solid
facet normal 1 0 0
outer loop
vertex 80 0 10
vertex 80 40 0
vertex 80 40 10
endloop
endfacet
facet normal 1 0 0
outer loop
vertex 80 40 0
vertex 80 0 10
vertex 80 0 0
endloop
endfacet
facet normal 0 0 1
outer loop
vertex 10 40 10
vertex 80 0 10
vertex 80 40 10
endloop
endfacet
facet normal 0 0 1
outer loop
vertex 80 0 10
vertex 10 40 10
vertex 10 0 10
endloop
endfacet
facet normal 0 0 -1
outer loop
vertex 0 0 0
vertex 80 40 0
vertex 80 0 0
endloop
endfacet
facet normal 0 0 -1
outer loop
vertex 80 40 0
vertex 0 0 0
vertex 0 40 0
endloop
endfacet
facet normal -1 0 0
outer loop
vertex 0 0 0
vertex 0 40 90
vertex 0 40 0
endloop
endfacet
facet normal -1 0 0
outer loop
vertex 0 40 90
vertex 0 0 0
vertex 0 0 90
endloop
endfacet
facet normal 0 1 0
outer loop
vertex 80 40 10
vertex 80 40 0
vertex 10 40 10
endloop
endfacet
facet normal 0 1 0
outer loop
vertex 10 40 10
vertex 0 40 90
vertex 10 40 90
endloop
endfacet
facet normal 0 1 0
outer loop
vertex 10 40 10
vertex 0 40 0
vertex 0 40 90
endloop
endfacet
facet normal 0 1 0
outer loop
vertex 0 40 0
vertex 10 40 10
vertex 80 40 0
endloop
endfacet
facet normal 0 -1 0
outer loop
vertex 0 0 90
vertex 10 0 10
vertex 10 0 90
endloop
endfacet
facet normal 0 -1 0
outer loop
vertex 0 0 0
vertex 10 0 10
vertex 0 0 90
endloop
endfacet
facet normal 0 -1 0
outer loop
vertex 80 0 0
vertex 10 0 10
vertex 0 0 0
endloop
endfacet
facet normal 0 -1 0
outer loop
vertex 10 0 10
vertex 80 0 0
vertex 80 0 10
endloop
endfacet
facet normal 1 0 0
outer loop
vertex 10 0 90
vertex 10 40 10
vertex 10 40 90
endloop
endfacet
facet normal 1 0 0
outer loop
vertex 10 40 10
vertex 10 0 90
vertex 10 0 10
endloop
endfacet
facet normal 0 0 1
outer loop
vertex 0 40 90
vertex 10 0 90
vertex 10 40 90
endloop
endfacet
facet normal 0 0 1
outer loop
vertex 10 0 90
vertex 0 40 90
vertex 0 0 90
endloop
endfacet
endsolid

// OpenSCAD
$fn = 64;
// L-bracket: base 80x40x10, wall 10x40x80 on top at x=0..10.
// Right-angle reentrant corner at (x=10, z=10); bottom is the ground contact face.
union() {
  cube([80, 40, 10]);
  translate([0, 0, 10]) cube([10, 40, 80]);
}
